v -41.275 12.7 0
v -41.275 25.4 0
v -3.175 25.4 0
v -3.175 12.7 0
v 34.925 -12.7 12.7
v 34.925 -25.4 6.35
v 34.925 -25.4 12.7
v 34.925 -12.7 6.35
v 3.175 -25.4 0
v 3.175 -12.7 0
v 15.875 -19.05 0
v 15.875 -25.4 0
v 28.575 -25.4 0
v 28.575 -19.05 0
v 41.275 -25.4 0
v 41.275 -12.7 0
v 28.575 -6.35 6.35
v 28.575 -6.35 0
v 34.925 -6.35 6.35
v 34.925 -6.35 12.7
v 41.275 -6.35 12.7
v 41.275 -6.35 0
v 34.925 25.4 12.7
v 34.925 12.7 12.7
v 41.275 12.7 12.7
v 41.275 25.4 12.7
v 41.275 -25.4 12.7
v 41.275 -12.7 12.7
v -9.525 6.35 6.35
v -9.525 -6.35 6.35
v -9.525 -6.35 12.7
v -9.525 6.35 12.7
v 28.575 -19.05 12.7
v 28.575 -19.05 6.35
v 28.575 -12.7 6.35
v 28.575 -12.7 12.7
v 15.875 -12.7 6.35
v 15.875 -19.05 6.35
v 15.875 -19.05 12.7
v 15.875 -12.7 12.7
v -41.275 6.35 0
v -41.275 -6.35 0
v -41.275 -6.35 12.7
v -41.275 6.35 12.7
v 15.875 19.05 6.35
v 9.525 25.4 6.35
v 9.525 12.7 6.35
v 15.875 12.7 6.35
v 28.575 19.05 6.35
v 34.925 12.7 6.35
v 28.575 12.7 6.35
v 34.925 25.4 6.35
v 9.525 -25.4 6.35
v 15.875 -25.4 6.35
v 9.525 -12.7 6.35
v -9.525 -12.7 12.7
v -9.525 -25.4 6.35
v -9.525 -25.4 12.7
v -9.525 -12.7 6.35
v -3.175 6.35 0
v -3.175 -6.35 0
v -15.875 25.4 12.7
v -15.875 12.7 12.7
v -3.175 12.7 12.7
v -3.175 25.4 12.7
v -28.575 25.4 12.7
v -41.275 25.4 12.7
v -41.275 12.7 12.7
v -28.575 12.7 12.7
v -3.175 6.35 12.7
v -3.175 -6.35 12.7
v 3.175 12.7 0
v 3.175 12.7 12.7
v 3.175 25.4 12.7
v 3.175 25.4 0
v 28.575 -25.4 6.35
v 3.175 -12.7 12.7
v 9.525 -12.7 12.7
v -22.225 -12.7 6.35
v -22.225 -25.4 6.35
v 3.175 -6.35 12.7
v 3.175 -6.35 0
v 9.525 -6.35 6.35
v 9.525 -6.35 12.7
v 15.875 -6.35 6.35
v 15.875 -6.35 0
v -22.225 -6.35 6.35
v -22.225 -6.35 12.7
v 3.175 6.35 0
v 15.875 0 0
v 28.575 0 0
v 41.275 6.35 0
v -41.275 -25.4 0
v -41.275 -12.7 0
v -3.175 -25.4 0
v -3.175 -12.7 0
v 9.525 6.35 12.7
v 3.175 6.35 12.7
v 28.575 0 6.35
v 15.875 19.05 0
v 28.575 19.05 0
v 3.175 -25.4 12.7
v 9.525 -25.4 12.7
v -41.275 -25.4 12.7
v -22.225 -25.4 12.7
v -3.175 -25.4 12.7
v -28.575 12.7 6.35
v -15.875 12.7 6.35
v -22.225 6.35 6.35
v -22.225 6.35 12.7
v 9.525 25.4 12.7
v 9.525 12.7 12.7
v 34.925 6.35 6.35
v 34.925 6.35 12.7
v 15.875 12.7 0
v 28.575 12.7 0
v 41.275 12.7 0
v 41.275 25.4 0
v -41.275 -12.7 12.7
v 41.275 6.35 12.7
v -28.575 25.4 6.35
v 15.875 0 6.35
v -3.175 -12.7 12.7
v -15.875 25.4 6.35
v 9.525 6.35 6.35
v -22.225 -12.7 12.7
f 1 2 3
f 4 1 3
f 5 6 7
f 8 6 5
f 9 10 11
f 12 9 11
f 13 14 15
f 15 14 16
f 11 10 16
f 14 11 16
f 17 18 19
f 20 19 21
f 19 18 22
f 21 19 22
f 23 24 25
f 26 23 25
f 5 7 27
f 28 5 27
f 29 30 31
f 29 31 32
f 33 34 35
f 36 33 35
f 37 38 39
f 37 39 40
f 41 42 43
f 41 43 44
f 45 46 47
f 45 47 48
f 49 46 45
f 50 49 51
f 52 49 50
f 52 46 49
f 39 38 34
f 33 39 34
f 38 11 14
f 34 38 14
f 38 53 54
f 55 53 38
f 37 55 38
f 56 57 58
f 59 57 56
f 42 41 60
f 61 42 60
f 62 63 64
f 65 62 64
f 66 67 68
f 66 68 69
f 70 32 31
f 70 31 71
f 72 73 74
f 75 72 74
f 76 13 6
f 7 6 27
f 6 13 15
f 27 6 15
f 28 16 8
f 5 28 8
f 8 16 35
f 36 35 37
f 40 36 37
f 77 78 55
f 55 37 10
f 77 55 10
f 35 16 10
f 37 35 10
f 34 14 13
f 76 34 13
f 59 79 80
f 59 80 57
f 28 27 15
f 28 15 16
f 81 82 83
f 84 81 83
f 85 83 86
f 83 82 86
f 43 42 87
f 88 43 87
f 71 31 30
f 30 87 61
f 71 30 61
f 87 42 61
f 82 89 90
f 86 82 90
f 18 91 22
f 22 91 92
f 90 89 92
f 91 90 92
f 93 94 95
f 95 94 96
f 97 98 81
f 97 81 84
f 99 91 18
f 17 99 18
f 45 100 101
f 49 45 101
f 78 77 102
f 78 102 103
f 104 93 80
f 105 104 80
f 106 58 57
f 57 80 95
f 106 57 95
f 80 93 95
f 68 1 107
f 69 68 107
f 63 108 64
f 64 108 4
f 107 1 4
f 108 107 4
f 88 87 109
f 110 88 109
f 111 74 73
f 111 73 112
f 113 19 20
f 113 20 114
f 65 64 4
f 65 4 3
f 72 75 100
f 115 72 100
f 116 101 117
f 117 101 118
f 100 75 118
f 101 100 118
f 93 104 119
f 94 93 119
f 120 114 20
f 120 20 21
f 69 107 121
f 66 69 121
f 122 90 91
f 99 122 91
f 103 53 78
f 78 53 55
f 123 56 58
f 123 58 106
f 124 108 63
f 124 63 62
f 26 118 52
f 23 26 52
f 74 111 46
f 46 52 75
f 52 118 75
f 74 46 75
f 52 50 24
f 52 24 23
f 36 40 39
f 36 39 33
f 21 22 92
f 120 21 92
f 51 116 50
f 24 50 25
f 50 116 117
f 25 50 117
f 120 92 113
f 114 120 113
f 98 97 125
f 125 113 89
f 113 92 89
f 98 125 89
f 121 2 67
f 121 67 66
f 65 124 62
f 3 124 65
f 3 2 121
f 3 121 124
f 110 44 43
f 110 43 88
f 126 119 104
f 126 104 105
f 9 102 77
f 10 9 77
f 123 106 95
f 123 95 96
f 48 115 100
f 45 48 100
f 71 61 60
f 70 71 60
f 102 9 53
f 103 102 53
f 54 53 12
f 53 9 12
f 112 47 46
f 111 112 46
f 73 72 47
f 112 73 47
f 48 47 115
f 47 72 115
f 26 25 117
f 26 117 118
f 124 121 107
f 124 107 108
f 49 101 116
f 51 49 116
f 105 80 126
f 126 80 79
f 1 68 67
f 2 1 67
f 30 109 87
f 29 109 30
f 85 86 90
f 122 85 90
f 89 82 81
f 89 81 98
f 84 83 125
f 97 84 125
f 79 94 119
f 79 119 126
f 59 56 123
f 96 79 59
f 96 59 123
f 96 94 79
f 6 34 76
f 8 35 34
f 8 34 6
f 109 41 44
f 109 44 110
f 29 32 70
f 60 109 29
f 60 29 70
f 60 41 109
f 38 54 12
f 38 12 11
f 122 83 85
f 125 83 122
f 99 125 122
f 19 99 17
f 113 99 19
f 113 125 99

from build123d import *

# Parameters (mm, degrees)
F0_W     = 12.7000005782
F0_H     = 12.7
F1_DEPTH = 12.7
F0_W_2   = 12.6999994218
F0_W_3   = 19.05
F0_W_4   = 6.35
F0_H_2   = 6.35
F0_W_5   = 6.3500002891
F0_W_6   = 12.7
F2_DEPTH = 6.35


with BuildPart() as f1:
    # F0 (on Top) → F1 (new body)
    with BuildSketch(Plane.XY):
        with Locations((-34.9249997109, 19.05)):
            Rectangle(F0_W, F0_H)
    extrude(amount=F1_DEPTH)



with BuildPart() as f1b:
    # F0 (on Top) → F1, piece 2 (new body)
    with BuildSketch(Plane.XY):
        with Locations((-9.5249997109, 19.05)):
            Rectangle(F0_W_2, F0_H)
    extrude(amount=F1_DEPTH)


with BuildPart() as f1c:
    # F0 (on Top) → F1, piece 3 (new body)
    with BuildSketch(Plane.XY):
        with Locations((-31.75, 0)):
            Rectangle(F0_W_3, F0_H)
    extrude(amount=F1_DEPTH)



with BuildPart() as f1d:
    # F0 (on Top) → F1, piece 4 (new body)
    with BuildSketch(Plane.XY):
        with Locations((-6.35, 0)):
            Rectangle(F0_W_4, F0_H)
    extrude(amount=F1_DEPTH)


with BuildPart() as f1e:
    # F0 (on Top) → F1, piece 5 (new body)
    with BuildSketch(Plane.XY):
        with Locations((-6.35, -19.05)):
            Rectangle(F0_W_4, F0_H)
    extrude(amount=F1_DEPTH)



with BuildPart() as f1f:
    # F0 (on Top) → F1, piece 6 (new body)
    with BuildSketch(Plane.XY):
        with Locations((-31.75, -19.05)):
            Rectangle(F0_W_3, F0_H)
    extrude(amount=F1_DEPTH)


with BuildPart() as f1g:
    # F0 (on Top) → F1, piece 7 (new body)
    with BuildSketch(Plane.XY):
        with Locations((6.35, -19.05)):
            Rectangle(F0_W_4, F0_H)
    extrude(amount=F1_DEPTH)



with BuildPart() as f1h:
    # F0 (on Top) → F1, piece 8 (new body)
    with BuildSketch(Plane.XY):
        with Locations((22.2249997109, -15.875)):
            Rectangle(F0_W_2, F0_H_2)
    extrude(amount=F1_DEPTH)


with BuildPart() as f1i:
    # F0 (on Top) → F1, piece 9 (new body)
    with BuildSketch(Plane.XY):
        with Locations((38.0999998555, -19.05)):
            Rectangle(F0_W_5, F0_H)
    extrude(amount=F1_DEPTH)


with BuildPart() as f1j:
    # F0 (on Top) → F1, piece 10 (new body)
    with BuildSketch(Plane.XY):
        with Locations((38.0999998555, 0)):
            Rectangle(F0_W_5, F0_H)
    extrude(amount=F1_DEPTH)



with BuildPart() as f1k:
    # F0 (on Top) → F1, piece 11 (new body)
    with BuildSketch(Plane.XY):
        with Locations((6.35, 0)):
            Rectangle(F0_W_4, F0_H)
    extrude(amount=F1_DEPTH)


with BuildPart() as f1l:
    # F0 (on Top) → F1, piece 12 (new body)
    with BuildSketch(Plane.XY):
        with Locations((6.35, 19.05)):
            Rectangle(F0_W_4, F0_H)
    extrude(amount=F1_DEPTH)



with BuildPart() as f1m:
    # F0 (on Top) → F1, piece 13 (new body)
    with BuildSketch(Plane.XY):
        with Locations((38.0999998555, 19.05)):
            Rectangle(F0_W_5, F0_H)
    extrude(amount=F1_DEPTH)


with BuildPart() as f1_1:
    add(f1.part)

    add(f1b.part)  # F2 merges F1b
    # F0 (on Top) → F2 (join)
    with BuildSketch(Plane.XY):
        with Locations((-22.2249994218, 19.05)):
            Rectangle(F0_W_6, F0_H)
    extrude(amount=F2_DEPTH)


with BuildPart() as f1c_1:
    add(f1c.part)

    add(f1d.part)  # F2#2 merges F1d
    # F0 (on Top) → F2, piece 2 (join)
    with BuildSketch(Plane.XY):
        with Locations((-15.875, 0)):
            Rectangle(F0_W_6, F0_H)
    extrude(amount=F2_DEPTH)


with BuildPart() as f1j_1:
    add(f1j.part)

    add(f1k.part)  # F2#3 merges F1k
    # F0 (on Top) → F2, piece 3 (join)
    with BuildSketch(Plane.XY):
        Polygon((28.5749994218, -6.35), (34.9249997109, -6.35), (34.9249997109, 6.35), (9.525, 6.35), (9.525, -6.35), (15.875, -6.35), (15.875, 0), (28.5749994218, 0), align=None)
    extrude(amount=F2_DEPTH)


with BuildPart() as f1l_1:
    add(f1l.part)

    add(f1m.part)  # F2#4 merges F1m
    # F0 (on Top) → F2, piece 4 (join)
    with BuildSketch(Plane.XY):
        Polygon((34.9249997109, 12.7), (34.9249997109, 25.4), (28.5749994218, 25.4), (9.525, 25.4), (9.525, 12.7), (15.875, 12.7), (15.875, 19.05), (28.5749994218, 19.05), (28.5749994218, 12.7), align=None)
    extrude(amount=F2_DEPTH)


with BuildPart() as f1g_1:
    add(f1g.part)

    add(f1h.part)  # F2#5 merges F1h

    add(f1i.part)  # F2#5 merges F1i
    # F0 (on Top) → F2, piece 5 (join)
    with BuildSketch(Plane.XY):
        Polygon((15.875, -25.4), (15.875, -19.05), (15.875, -12.7), (9.525, -12.7), (9.525, -25.4), align=None)
        Polygon((28.5749994218, -25.4), (34.9249997109, -25.4), (34.9249997109, -12.7), (28.5749994218, -12.7), (28.5749994218, -19.05), align=None)
    extrude(amount=F2_DEPTH)


with BuildPart() as f1e_1:
    add(f1e.part)

    add(f1f.part)  # F2#6 merges F1f
    # F0 (on Top) → F2, piece 6 (join)
    with BuildSketch(Plane.XY):
        with Locations((-15.875, -19.05)):
            Rectangle(F0_W_6, F0_H)
    extrude(amount=F2_DEPTH)


solid = Compound([f1_1.part, f1c_1.part, f1j_1.part, f1l_1.part, f1g_1.part, f1e_1.part])
